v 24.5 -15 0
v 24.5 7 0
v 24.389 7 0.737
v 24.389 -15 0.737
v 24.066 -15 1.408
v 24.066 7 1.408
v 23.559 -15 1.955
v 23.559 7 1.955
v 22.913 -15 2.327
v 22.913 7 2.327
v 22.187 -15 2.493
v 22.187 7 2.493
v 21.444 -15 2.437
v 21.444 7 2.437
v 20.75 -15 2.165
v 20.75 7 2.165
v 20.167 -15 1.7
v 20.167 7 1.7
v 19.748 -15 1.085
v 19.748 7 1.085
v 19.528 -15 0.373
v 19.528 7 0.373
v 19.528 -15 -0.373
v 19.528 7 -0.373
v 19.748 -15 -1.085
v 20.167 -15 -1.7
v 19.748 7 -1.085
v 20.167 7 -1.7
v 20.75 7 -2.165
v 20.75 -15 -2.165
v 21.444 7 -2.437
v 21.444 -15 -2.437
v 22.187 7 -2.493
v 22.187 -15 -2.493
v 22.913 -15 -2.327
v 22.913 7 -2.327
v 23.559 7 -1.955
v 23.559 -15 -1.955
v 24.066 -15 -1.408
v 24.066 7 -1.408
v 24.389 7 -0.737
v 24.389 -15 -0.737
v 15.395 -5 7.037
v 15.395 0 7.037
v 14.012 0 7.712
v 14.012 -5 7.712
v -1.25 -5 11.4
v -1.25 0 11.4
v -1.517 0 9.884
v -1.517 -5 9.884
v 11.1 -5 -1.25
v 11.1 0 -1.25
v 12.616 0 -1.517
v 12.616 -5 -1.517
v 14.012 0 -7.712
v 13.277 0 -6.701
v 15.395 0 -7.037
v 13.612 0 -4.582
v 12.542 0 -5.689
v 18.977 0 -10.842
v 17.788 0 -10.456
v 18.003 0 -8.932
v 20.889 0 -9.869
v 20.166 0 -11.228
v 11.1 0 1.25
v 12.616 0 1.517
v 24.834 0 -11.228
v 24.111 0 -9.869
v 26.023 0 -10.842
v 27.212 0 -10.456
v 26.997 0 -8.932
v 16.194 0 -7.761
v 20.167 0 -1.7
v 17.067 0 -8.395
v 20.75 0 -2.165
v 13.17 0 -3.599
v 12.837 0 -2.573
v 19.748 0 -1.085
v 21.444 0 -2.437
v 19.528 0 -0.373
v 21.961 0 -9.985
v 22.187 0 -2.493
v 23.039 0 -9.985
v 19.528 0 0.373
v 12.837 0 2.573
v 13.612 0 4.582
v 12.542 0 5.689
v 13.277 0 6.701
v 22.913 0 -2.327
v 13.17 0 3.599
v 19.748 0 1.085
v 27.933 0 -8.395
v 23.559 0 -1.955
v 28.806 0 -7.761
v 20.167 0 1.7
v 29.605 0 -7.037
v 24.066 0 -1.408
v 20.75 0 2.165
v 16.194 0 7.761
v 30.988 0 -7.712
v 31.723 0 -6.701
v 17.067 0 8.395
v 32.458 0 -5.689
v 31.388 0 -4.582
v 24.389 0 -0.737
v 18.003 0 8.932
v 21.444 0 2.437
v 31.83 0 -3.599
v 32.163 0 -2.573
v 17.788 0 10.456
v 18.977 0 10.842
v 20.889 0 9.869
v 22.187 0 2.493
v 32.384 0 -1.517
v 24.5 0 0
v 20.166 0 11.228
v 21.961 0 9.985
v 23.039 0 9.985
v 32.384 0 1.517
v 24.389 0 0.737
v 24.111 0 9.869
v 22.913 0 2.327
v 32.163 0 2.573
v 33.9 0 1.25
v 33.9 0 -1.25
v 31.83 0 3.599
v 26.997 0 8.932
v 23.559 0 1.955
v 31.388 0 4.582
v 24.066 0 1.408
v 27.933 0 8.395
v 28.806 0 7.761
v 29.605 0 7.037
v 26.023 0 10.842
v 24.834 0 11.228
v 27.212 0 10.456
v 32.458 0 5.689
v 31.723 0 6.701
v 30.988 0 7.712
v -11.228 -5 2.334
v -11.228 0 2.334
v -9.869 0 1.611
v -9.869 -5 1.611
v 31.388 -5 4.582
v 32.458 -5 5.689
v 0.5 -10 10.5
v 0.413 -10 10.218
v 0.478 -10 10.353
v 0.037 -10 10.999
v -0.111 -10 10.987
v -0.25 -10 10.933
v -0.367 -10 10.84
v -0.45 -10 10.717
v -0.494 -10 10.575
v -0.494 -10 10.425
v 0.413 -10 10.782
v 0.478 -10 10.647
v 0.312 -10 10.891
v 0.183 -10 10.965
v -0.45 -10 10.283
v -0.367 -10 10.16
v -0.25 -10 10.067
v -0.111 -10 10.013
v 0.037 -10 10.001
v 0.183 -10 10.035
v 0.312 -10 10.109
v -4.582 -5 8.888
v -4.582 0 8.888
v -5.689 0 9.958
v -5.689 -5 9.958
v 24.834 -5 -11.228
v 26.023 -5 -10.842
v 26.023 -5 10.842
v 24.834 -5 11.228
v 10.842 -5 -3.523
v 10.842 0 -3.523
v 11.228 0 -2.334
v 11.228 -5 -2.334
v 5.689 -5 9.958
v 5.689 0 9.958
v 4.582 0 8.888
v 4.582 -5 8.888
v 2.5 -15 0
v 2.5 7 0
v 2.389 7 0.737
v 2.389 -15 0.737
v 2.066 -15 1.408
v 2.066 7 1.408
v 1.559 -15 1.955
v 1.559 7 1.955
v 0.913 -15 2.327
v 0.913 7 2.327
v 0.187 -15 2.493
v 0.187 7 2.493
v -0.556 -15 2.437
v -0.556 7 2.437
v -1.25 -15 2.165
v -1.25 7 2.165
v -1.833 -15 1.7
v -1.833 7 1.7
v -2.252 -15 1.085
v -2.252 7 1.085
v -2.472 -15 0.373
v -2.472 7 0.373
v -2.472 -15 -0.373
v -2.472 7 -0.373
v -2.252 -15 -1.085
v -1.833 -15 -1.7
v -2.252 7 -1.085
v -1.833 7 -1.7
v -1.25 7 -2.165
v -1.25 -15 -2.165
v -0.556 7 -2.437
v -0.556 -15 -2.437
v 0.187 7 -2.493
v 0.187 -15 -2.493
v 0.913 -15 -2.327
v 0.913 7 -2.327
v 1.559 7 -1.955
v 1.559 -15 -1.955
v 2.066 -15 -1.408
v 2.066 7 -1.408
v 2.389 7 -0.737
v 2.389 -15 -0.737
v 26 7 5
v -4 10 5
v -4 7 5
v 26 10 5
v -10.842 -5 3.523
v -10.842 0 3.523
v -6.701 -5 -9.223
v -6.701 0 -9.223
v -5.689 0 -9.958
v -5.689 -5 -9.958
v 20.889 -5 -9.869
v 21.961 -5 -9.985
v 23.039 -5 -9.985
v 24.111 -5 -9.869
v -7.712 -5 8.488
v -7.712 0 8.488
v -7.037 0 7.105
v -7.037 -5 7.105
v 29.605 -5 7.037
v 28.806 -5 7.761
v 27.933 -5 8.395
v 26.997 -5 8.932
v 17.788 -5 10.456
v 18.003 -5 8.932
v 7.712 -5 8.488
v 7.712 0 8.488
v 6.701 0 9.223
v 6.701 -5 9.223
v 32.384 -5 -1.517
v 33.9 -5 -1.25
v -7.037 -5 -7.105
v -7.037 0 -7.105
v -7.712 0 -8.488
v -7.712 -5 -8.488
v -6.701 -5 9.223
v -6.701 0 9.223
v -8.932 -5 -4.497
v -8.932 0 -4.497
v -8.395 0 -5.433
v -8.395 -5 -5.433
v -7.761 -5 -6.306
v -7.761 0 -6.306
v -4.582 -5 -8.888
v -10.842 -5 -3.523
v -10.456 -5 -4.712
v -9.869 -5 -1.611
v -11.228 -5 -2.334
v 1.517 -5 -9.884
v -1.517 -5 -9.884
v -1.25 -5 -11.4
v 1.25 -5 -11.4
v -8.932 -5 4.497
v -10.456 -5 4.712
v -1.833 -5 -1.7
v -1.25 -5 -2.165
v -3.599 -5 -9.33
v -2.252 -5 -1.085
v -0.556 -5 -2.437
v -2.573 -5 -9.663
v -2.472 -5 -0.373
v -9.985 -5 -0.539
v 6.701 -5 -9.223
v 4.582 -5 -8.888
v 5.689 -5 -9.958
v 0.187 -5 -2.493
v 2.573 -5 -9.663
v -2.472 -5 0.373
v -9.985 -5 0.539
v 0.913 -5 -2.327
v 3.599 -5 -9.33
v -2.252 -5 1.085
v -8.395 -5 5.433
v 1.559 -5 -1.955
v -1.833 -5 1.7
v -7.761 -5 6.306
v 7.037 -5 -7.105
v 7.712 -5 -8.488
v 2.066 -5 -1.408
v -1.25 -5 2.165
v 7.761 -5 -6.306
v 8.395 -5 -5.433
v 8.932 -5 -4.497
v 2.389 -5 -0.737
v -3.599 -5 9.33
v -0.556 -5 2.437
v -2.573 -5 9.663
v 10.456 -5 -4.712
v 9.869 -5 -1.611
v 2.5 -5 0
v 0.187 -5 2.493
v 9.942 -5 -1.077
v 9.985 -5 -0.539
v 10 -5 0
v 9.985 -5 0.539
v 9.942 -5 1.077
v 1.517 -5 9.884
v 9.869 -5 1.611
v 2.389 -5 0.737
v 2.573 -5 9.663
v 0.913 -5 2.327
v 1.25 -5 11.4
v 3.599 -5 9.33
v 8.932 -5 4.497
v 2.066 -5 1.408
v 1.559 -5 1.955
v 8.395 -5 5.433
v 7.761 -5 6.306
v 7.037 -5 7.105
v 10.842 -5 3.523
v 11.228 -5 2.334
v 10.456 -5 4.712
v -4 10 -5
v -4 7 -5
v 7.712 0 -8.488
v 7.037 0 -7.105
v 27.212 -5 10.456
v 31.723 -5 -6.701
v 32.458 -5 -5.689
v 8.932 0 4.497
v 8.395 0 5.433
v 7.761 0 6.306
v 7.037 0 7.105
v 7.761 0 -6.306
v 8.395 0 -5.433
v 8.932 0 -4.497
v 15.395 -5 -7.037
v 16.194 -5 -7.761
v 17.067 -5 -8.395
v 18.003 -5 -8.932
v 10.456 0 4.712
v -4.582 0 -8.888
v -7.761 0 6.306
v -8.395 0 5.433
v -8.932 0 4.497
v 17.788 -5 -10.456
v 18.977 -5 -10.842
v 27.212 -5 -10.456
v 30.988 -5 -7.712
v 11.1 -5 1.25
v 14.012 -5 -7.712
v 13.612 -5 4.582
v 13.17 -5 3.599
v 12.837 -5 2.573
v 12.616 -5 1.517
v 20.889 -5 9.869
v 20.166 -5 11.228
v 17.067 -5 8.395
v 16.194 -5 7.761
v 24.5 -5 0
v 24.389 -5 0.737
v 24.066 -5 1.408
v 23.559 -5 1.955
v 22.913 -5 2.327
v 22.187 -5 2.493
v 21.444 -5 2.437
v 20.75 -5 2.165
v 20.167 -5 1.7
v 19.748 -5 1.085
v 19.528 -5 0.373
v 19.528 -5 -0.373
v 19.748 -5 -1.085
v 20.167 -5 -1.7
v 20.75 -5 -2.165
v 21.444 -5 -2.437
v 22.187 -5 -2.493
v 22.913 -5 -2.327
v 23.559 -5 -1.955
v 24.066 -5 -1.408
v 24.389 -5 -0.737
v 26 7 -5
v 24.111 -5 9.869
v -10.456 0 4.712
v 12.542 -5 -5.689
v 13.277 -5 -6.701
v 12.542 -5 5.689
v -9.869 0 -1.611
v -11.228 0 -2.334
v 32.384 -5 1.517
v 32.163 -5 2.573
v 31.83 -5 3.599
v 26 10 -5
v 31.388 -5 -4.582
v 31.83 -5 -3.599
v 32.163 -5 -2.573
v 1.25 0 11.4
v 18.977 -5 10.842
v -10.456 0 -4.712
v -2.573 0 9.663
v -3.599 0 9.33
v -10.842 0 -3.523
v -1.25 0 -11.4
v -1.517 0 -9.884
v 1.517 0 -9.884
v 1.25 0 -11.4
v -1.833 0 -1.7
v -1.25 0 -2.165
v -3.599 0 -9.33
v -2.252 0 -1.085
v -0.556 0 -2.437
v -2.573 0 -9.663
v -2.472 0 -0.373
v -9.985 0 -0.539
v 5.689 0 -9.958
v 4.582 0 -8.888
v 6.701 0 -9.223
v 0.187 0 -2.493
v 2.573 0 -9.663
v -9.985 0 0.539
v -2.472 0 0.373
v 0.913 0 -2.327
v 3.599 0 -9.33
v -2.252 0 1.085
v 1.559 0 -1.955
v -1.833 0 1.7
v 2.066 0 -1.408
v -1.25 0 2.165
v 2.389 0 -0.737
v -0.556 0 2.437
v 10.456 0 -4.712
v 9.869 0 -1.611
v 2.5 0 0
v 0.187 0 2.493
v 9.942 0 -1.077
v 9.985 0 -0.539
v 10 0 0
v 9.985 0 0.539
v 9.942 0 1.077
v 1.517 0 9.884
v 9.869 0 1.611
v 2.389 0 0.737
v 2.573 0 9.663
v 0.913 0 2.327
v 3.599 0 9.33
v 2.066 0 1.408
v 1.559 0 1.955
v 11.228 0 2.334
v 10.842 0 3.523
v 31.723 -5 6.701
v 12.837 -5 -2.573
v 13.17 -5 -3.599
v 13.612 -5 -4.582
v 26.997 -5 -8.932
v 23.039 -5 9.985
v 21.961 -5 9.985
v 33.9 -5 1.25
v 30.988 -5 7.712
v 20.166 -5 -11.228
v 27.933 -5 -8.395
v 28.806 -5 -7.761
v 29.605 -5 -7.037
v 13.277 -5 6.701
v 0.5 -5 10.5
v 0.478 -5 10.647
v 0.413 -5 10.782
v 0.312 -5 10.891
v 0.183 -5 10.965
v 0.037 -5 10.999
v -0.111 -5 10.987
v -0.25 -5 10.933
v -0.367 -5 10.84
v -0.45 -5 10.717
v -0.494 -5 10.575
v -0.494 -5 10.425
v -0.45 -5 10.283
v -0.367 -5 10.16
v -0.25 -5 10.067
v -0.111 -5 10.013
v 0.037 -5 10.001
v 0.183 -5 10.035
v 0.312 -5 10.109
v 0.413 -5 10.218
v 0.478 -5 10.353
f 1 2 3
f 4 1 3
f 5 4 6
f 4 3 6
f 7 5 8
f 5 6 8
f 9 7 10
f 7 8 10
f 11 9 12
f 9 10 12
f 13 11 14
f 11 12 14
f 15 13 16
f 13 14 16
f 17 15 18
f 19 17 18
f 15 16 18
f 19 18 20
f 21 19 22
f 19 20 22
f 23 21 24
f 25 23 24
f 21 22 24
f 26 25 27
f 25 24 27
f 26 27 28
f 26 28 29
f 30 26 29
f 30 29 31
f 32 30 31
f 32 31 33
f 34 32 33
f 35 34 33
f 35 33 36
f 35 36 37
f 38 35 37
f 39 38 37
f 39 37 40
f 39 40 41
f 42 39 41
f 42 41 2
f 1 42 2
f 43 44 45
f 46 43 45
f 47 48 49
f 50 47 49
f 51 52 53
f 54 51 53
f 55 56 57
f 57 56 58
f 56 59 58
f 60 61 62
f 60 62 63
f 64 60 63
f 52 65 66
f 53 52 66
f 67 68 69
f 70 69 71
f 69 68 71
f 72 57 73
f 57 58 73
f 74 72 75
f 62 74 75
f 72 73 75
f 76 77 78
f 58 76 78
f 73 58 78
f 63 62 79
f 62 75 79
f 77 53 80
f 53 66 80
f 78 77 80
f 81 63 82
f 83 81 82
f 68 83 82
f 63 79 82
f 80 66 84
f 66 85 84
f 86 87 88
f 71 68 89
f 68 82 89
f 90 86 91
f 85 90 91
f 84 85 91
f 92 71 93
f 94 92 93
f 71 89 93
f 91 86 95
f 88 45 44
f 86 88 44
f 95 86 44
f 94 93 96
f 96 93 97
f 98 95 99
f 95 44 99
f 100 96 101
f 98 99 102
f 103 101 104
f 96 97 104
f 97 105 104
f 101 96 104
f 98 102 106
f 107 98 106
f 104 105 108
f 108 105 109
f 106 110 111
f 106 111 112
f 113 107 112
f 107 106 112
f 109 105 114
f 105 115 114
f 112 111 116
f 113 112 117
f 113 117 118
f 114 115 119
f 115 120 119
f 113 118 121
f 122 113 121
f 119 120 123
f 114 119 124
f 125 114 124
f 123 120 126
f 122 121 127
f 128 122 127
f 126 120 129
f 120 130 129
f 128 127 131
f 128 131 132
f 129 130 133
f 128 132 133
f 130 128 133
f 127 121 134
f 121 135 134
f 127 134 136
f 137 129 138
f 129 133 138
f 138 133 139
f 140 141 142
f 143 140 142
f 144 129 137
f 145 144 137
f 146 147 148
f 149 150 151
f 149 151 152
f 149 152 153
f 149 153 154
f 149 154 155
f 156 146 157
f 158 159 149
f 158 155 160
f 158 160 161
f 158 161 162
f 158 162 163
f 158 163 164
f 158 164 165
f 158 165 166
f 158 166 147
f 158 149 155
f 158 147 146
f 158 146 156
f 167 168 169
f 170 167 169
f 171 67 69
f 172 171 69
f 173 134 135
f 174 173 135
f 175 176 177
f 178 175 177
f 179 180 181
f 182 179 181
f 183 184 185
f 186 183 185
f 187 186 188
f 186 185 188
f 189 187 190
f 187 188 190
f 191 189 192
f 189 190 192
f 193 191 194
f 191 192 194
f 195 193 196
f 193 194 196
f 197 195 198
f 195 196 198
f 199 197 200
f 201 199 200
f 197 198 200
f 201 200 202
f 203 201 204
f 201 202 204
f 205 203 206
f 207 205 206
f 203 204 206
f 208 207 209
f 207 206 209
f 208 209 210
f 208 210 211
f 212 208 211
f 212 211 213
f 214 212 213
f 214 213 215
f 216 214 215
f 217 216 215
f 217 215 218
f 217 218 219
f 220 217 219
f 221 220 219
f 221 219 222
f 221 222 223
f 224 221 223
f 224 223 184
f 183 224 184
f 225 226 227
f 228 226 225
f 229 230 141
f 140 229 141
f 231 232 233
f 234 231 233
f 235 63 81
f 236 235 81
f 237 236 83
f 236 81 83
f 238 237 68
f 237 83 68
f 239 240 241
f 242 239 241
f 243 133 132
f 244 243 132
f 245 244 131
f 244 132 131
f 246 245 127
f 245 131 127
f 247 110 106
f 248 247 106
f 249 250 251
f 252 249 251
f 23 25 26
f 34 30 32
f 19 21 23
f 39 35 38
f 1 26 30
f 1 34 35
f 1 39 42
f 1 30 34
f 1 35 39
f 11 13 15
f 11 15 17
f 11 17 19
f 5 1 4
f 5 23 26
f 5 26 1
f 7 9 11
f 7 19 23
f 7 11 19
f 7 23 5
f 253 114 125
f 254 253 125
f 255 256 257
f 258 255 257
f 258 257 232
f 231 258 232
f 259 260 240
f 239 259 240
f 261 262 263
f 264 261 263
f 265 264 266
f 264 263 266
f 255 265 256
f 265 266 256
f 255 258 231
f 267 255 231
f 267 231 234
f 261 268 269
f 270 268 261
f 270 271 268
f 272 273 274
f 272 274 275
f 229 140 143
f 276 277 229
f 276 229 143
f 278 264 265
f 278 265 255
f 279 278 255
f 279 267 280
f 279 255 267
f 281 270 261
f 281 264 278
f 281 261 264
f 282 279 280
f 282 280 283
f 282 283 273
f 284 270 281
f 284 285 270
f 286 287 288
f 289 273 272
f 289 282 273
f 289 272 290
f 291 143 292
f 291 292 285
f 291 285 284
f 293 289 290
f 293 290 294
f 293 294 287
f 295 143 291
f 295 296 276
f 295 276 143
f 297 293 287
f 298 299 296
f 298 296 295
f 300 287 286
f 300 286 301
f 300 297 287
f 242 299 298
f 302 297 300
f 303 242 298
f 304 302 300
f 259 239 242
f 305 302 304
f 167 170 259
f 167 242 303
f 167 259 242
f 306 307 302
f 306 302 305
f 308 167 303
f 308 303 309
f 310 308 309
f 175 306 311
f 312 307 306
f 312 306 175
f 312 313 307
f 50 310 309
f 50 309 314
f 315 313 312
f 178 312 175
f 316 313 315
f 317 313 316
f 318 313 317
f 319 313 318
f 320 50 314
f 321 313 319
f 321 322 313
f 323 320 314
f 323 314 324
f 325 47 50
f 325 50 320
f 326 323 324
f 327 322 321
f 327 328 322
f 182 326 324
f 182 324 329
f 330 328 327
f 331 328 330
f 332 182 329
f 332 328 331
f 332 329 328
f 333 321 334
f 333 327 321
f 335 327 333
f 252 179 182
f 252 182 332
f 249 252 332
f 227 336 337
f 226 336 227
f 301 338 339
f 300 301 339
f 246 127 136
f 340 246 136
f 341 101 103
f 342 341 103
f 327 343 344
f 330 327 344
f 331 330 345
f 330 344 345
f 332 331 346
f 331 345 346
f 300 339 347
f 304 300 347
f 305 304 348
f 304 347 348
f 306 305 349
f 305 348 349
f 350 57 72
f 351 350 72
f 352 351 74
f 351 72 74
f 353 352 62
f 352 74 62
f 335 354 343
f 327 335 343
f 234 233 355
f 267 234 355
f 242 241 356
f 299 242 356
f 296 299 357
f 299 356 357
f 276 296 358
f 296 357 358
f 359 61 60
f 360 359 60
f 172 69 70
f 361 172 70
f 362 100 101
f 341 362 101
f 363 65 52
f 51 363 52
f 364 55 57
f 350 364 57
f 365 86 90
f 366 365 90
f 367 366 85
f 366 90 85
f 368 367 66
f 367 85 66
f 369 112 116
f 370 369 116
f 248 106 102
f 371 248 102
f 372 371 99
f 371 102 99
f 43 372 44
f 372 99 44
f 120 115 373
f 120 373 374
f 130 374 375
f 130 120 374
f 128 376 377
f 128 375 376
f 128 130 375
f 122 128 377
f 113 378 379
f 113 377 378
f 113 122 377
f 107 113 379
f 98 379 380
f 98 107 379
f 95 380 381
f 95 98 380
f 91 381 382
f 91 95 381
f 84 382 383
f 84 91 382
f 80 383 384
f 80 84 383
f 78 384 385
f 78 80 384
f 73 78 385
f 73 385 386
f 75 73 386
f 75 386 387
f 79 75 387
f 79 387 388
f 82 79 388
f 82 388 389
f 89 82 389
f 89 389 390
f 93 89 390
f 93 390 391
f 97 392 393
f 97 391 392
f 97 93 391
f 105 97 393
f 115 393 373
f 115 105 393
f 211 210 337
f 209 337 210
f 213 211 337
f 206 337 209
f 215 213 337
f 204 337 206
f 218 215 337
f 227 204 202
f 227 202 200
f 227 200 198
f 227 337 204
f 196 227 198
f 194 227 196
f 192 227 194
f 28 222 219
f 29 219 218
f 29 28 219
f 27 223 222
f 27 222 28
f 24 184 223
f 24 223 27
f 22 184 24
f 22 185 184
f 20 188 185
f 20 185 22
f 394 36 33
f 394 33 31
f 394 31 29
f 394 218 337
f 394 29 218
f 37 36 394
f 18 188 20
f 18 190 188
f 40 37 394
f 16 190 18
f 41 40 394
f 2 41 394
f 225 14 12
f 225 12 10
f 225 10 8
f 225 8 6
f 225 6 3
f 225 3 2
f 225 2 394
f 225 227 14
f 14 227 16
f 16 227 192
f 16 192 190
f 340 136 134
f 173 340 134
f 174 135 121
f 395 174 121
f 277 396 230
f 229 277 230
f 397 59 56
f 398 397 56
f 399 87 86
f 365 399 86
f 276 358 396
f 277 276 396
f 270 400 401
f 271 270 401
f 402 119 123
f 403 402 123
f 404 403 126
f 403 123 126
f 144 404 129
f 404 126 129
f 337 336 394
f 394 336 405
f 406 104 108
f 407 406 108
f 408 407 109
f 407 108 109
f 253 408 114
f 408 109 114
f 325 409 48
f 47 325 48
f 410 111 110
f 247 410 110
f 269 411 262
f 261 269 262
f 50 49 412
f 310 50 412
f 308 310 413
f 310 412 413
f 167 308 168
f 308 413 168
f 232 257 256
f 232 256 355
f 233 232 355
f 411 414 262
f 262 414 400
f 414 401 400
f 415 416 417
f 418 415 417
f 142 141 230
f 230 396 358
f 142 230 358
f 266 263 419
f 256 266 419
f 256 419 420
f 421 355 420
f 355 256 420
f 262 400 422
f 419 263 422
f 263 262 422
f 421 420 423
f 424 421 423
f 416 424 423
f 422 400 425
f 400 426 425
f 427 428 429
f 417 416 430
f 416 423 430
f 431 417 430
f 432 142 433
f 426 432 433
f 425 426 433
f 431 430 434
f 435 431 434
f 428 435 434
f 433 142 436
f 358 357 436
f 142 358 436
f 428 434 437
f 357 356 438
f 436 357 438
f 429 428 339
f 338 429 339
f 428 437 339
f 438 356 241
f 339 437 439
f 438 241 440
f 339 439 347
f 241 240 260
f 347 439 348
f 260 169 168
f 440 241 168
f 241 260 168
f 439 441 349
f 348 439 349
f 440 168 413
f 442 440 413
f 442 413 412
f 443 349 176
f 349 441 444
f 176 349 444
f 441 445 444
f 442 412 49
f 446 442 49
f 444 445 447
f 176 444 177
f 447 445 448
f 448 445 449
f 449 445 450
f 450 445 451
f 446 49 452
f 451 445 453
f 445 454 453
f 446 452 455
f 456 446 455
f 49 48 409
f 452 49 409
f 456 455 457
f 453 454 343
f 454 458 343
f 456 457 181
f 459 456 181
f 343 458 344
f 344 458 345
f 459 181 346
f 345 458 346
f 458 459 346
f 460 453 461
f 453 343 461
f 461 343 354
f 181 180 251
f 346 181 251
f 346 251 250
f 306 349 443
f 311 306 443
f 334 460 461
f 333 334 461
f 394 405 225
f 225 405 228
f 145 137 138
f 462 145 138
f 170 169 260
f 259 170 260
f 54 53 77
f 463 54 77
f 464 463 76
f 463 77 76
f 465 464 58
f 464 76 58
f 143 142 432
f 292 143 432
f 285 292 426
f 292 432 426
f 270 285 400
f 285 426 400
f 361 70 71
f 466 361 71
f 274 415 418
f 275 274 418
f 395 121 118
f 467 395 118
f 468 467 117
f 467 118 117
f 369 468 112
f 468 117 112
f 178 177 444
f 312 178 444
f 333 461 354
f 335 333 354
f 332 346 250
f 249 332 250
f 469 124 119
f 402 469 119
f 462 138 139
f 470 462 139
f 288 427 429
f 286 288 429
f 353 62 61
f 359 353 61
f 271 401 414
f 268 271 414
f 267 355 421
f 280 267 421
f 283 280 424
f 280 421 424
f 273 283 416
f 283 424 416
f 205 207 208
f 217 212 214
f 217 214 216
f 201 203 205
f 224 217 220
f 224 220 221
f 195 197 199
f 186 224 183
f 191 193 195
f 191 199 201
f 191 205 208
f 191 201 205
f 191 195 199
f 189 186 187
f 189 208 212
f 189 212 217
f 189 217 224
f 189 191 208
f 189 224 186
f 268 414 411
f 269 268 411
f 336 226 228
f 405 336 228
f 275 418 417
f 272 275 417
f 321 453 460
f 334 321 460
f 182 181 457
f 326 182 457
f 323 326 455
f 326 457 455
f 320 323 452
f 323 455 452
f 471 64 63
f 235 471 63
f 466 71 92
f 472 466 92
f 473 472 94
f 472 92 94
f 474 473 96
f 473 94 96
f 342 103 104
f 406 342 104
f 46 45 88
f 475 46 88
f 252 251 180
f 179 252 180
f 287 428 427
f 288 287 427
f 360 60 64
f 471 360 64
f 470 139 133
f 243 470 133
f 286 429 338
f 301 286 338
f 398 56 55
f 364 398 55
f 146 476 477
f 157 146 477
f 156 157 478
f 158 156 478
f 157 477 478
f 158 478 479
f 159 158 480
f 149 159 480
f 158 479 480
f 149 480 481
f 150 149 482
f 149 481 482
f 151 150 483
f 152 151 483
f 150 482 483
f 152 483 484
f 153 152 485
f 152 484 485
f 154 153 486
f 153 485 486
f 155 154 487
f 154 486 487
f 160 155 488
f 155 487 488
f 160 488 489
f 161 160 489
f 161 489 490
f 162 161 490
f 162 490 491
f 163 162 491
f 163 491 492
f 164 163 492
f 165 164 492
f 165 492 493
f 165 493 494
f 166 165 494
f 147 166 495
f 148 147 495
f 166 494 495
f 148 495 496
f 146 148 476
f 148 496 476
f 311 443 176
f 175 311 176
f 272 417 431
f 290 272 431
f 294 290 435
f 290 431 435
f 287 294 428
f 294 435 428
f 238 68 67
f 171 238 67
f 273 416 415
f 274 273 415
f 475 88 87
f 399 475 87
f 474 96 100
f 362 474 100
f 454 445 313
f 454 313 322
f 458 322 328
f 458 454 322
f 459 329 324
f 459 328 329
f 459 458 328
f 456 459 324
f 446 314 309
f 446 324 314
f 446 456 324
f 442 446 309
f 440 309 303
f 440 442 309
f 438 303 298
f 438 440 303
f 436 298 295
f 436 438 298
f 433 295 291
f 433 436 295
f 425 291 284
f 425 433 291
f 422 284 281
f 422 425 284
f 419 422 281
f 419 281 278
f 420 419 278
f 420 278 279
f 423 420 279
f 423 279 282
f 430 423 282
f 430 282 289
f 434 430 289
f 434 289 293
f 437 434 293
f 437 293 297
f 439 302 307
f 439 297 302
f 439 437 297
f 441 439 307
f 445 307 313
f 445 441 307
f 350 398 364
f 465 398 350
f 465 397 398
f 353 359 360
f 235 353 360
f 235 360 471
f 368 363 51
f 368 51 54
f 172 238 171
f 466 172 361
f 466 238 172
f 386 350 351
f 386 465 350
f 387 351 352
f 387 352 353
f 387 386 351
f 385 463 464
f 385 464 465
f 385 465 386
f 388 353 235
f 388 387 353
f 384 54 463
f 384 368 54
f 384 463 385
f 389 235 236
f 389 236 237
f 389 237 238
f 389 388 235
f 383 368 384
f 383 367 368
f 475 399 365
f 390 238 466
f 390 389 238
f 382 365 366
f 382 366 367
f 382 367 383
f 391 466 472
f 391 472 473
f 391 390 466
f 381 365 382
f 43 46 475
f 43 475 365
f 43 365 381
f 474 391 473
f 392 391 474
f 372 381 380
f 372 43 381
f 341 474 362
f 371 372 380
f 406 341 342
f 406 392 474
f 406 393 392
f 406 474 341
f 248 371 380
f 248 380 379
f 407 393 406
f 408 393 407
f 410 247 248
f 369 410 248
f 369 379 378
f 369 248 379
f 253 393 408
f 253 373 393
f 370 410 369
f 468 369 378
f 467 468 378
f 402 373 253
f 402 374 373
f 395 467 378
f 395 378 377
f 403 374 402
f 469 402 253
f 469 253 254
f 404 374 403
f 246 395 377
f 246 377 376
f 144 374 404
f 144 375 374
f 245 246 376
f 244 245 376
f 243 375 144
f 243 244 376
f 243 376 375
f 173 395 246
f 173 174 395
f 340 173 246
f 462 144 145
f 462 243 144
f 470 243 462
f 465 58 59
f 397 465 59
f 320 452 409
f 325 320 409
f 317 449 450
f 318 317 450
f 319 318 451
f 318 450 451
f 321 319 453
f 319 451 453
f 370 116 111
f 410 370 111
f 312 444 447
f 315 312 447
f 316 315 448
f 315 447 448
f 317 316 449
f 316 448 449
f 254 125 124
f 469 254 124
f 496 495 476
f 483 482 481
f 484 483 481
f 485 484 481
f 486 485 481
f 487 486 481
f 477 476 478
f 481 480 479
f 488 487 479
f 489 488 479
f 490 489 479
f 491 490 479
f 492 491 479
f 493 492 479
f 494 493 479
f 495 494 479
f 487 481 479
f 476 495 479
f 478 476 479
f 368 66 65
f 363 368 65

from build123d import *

# Parameters (mm, degrees)
F1_DEPTH  = 5
F3_DEPTH  = 5
F5_R      = 2.5
F6_DEPTH  = 25
F9_DEPTH  = 25
F11_W     = 30
F11_H     = 10
F12_DEPTH = 3
F13_R     = 0.5
F14_DEPTH = 5


with BuildPart() as f1:
    # F0 (on Front) → F1 (new body)
    with BuildSketch(Plane.XZ):
        with BuildLine():
            ThreePointArc((9.869319, -1.611382), (9.967276, -0.808336), (10, 0))
            ThreePointArc((10, 0), (9.967276, 0.808336), (9.869319, 1.611382))
            ThreePointArc((9.869319, 1.611382), (9.510565, 3.09017), (8.931593, 4.497405))
            ThreePointArc((8.931593, 4.497405), (8.09017, 5.877853), (7.0373, 7.104675))
            ThreePointArc((7.0373, 7.104675), (5.877853, 8.09017), (4.582302, 8.888335))
            ThreePointArc((4.582302, 8.888335), (3.09017, 9.510565), (1.517272, 9.884224))
            ThreePointArc((1.517272, 9.884224), (0, 10), (-1.517272, 9.884224))
            ThreePointArc((-1.517272, 9.884224), (-3.09017, 9.510565), (-4.582302, 8.888335))
            ThreePointArc((-4.582302, 8.888335), (-5.877853, 8.09017), (-7.0373, 7.104675))
            ThreePointArc((-7.0373, 7.104675), (-8.09017, 5.877853), (-8.931593, 4.497405))
            ThreePointArc((-8.931593, 4.497405), (-9.510565, 3.09017), (-9.869319, 1.611382))
            ThreePointArc((-9.869319, 1.611382), (-10, 0), (-9.869319, -1.611382))
            ThreePointArc((-9.869319, -1.611382), (-9.510565, -3.09017), (-8.931593, -4.497405))
            ThreePointArc((-8.931593, -4.497405), (-8.09017, -5.877853), (-7.0373, -7.104675))
            ThreePointArc((-7.0373, -7.104675), (-5.877853, -8.09017), (-4.582302, -8.888335))
            ThreePointArc((-4.582302, -8.888335), (-3.09017, -9.510565), (-1.517272, -9.884224))
            ThreePointArc((-1.517272, -9.884224), (0, -10), (1.517272, -9.884224))
            ThreePointArc((1.517272, -9.884224), (3.09017, -9.510565), (4.582302, -8.888335))
            ThreePointArc((4.582302, -8.888335), (5.877853, -8.09017), (7.0373, -7.104675))
            ThreePointArc((7.0373, -7.104675), (8.09017, -5.877853), (8.931593, -4.497405))
            ThreePointArc((8.931593, -4.497405), (9.510565, -3.09017), (9.869319, -1.611382))
        make_face()
        with BuildLine():
            ThreePointArc((8.931593, 4.497405), (9.510565, 3.09017), (9.869319, 1.611382))
            Line((9.869319, 1.611382), (11.228316, 2.333973))
            Line((11.228316, 2.333973), (10.842044, 3.522794))
            Line((10.842044, 3.522794), (10.455773, 4.711614))
            Line((10.455773, 4.711614), (8.931593, 4.497405))
        make_face()
        with BuildLine():
            Line((11.228316, -2.333973), (9.869319, -1.611382))
            ThreePointArc((9.869319, -1.611382), (9.510565, -3.09017), (8.931593, -4.497405))
            Line((8.931593, -4.497405), (10.455773, -4.711614))
            Line((10.455773, -4.711614), (10.842044, -3.522794))
            Line((10.842044, -3.522794), (11.228316, -2.333973))
        make_face()
        with BuildLine():
            ThreePointArc((4.582302, 8.888335), (5.877853, 8.09017), (7.0373, 7.104675))
            Line((7.0373, 7.104675), (7.712023, 8.488062))
            Line((7.712023, 8.488062), (6.700752, 9.222794))
            Line((6.700752, 9.222794), (5.689481, 9.957525))
            Line((5.689481, 9.957525), (4.582302, 8.888335))
        make_face()
        with BuildLine():
            Line((7.712023, -8.488062), (7.0373, -7.104675))
            ThreePointArc((7.0373, -7.104675), (5.877853, -8.09017), (4.582302, -8.888335))
            Line((4.582302, -8.888335), (5.689481, -9.957525))
            Line((5.689481, -9.957525), (6.700752, -9.222794))
            Line((6.700752, -9.222794), (7.712023, -8.488062))
        make_face()
        with BuildLine():
            ThreePointArc((-1.517272, 9.884224), (0, 10), (1.517272, 9.884224))
            Line((1.517272, 9.884224), (1.25, 11.4))
            Line((1.25, 11.4), (0, 11.4))
            Line((0, 11.4), (-1.25, 11.4))
            Line((-1.25, 11.4), (-1.517272, 9.884224))
        make_face()
        with BuildLine():
            Line((1.25, -11.4), (1.517272, -9.884224))
            ThreePointArc((1.517272, -9.884224), (0, -10), (-1.517272, -9.884224))
            Line((-1.517272, -9.884224), (-1.25, -11.4))
            Line((-1.25, -11.4), (0, -11.4))
            Line((0, -11.4), (1.25, -11.4))
        make_face()
        with BuildLine():
            ThreePointArc((-7.0373, 7.104675), (-5.877853, 8.09017), (-4.582302, 8.888335))
            Line((-4.582302, 8.888335), (-5.689481, 9.957525))
            Line((-5.689481, 9.957525), (-6.700752, 9.222794))
            Line((-6.700752, 9.222794), (-7.712023, 8.488062))
            Line((-7.712023, 8.488062), (-7.0373, 7.104675))
        make_face()
        with BuildLine():
            Line((-5.689481, -9.957525), (-4.582302, -8.888335))
            ThreePointArc((-4.582302, -8.888335), (-5.877853, -8.09017), (-7.0373, -7.104675))
            Line((-7.0373, -7.104675), (-7.712023, -8.488062))
            Line((-7.712023, -8.488062), (-6.700752, -9.222794))
            Line((-6.700752, -9.222794), (-5.689481, -9.957525))
        make_face()
        with BuildLine():
            ThreePointArc((-9.869319, 1.611382), (-9.510565, 3.09017), (-8.931593, 4.497405))
            Line((-8.931593, 4.497405), (-10.455773, 4.711614))
            Line((-10.455773, 4.711614), (-10.842044, 3.522794))
            Line((-10.842044, 3.522794), (-11.228316, 2.333973))
            Line((-11.228316, 2.333973), (-9.869319, 1.611382))
        make_face()
        with BuildLine():
            Line((-10.455773, -4.711614), (-8.931593, -4.497405))
            ThreePointArc((-8.931593, -4.497405), (-9.510565, -3.09017), (-9.869319, -1.611382))
            Line((-9.869319, -1.611382), (-11.228316, -2.333973))
            Line((-11.228316, -2.333973), (-10.842044, -3.522794))
            Line((-10.842044, -3.522794), (-10.455773, -4.711614))
        make_face()
    extrude(amount=F1_DEPTH)


with BuildPart() as f3:
    # F2 (on Front) → F3 (new body)
    with BuildSketch(Plane.XZ):
        with BuildLine():
            Line((11.1, 1.25), (11.1, 0))
            Line((11.1, 0), (12.5, 0))
            ThreePointArc((12.5, 0), (12.528986, 0.760841), (12.615776, 1.517272))
            Line((12.615776, 1.517272), (11.1, 1.25))
        make_face()
        with BuildLine():
            Line((12.5, 0), (11.1, 0))
            Line((11.1, 0), (11.1, -1.25))
            Line((11.1, -1.25), (12.615776, -1.517272))
            ThreePointArc((12.615776, -1.517272), (12.528986, -0.760841), (12.5, 0))
        make_face()
        with BuildLine():
            ThreePointArc((12.615776, 1.517272), (12.528986, 0.760841), (12.5, 0))
            ThreePointArc((12.5, 0), (12.528986, -0.760841), (12.615776, -1.517272))
            ThreePointArc((12.615776, -1.517272), (12.989435, -3.09017), (13.611665, -4.582302))
            ThreePointArc((13.611665, -4.582302), (14.40983, -5.877853), (15.395325, -7.0373))
            ThreePointArc((15.395325, -7.0373), (16.622147, -8.09017), (18.002595, -8.931593))
            ThreePointArc((18.002595, -8.931593), (19.40983, -9.510565), (20.888618, -9.869319))
            ThreePointArc((20.888618, -9.869319), (22.5, -10), (24.111382, -9.869319))
            ThreePointArc((24.111382, -9.869319), (25.59017, -9.510565), (26.997405, -8.931593))
            ThreePointArc((26.997405, -8.931593), (28.377853, -8.09017), (29.604675, -7.0373))
            ThreePointArc((29.604675, -7.0373), (30.59017, -5.877853), (31.388335, -4.582302))
            ThreePointArc((31.388335, -4.582302), (32.010565, -3.09017), (32.384224, -1.517272))
            ThreePointArc((32.384224, -1.517272), (32.471014, -0.760841), (32.5, 0))
            ThreePointArc((32.5, 0), (32.471014, 0.760841), (32.384224, 1.517272))
            ThreePointArc((32.384224, 1.517272), (32.010565, 3.09017), (31.388335, 4.582302))
            ThreePointArc((31.388335, 4.582302), (30.59017, 5.877853), (29.604675, 7.0373))
            ThreePointArc((29.604675, 7.0373), (28.377853, 8.09017), (26.997405, 8.931593))
            ThreePointArc((26.997405, 8.931593), (25.59017, 9.510565), (24.111382, 9.869319))
            ThreePointArc((24.111382, 9.869319), (22.5, 10), (20.888618, 9.869319))
            ThreePointArc((20.888618, 9.869319), (19.40983, 9.510565), (18.002595, 8.931593))
            ThreePointArc((18.002595, 8.931593), (16.622147, 8.09017), (15.395325, 7.0373))
            ThreePointArc((15.395325, 7.0373), (14.40983, 5.877853), (13.611665, 4.582302))
            ThreePointArc((13.611665, 4.582302), (12.989435, 3.09017), (12.615776, 1.517272))
        make_face()
        with BuildLine():
            Line((12.542475, 5.689481), (13.611665, 4.582302))
            ThreePointArc((13.611665, 4.582302), (14.40983, 5.877853), (15.395325, 7.0373))
            Line((15.395325, 7.0373), (14.011938, 7.712023))
            Line((14.011938, 7.712023), (13.277206, 6.700752))
            Line((13.277206, 6.700752), (12.542475, 5.689481))
        make_face()
        with BuildLine():
            ThreePointArc((15.395325, -7.0373), (14.40983, -5.877853), (13.611665, -4.582302))
            Line((13.611665, -4.582302), (12.542475, -5.689481))
            Line((12.542475, -5.689481), (13.277206, -6.700752))
            Line((13.277206, -6.700752), (14.011938, -7.712023))
            Line((14.011938, -7.712023), (15.395325, -7.0373))
        make_face()
        with BuildLine():
            Line((17.788386, 10.455773), (18.002595, 8.931593))
            ThreePointArc((18.002595, 8.931593), (19.40983, 9.510565), (20.888618, 9.869319))
            Line((20.888618, 9.869319), (20.166027, 11.228316))
            Line((20.166027, 11.228316), (18.977206, 10.842044))
            Line((18.977206, 10.842044), (17.788386, 10.455773))
        make_face()
        with BuildLine():
            ThreePointArc((20.888618, -9.869319), (19.40983, -9.510565), (18.002595, -8.931593))
            Line((18.002595, -8.931593), (17.788386, -10.455773))
            Line((17.788386, -10.455773), (18.977206, -10.842044))
            Line((18.977206, -10.842044), (20.166027, -11.228316))
            Line((20.166027, -11.228316), (20.888618, -9.869319))
        make_face()
        with BuildLine():
            Line((24.833973, 11.228316), (24.111382, 9.869319))
            ThreePointArc((24.111382, 9.869319), (25.59017, 9.510565), (26.997405, 8.931593))
            Line((26.997405, 8.931593), (27.211614, 10.455773))
            Line((27.211614, 10.455773), (26.022794, 10.842044))
            Line((26.022794, 10.842044), (24.833973, 11.228316))
        make_face()
        with BuildLine():
            ThreePointArc((26.997405, -8.931593), (25.59017, -9.510565), (24.111382, -9.869319))
            Line((24.111382, -9.869319), (24.833973, -11.228316))
            Line((24.833973, -11.228316), (26.022794, -10.842044))
            Line((26.022794, -10.842044), (27.211614, -10.455773))
            Line((27.211614, -10.455773), (26.997405, -8.931593))
        make_face()
        with BuildLine():
            Line((30.988062, 7.712023), (29.604675, 7.0373))
            ThreePointArc((29.604675, 7.0373), (30.59017, 5.877853), (31.388335, 4.582302))
            Line((31.388335, 4.582302), (32.457525, 5.689481))
            Line((32.457525, 5.689481), (31.722794, 6.700752))
            Line((31.722794, 6.700752), (30.988062, 7.712023))
        make_face()
        with BuildLine():
            ThreePointArc((31.388335, -4.582302), (30.59017, -5.877853), (29.604675, -7.0373))
            Line((29.604675, -7.0373), (30.988062, -7.712023))
            Line((30.988062, -7.712023), (31.722794, -6.700752))
            Line((31.722794, -6.700752), (32.457525, -5.689481))
            Line((32.457525, -5.689481), (31.388335, -4.582302))
        make_face()
        with BuildLine():
            Line((33.9, 1.25), (32.384224, 1.517272))
            ThreePointArc((32.384224, 1.517272), (32.471014, 0.760841), (32.5, 0))
            ThreePointArc((32.5, 0), (32.471014, -0.760841), (32.384224, -1.517272))
            Line((32.384224, -1.517272), (33.9, -1.25))
            Line((33.9, -1.25), (33.9, 0))
            Line((33.9, 0), (33.9, 1.25))
        make_face()
    extrude(amount=F3_DEPTH)


with BuildPart() as f6:
    # F5 (on offset) → F6 (new body)
    with BuildSketch(Plane.XZ.offset(-10)):
        Circle(F5_R)
    extrude(amount=F6_DEPTH)



with BuildPart() as f1_1:
    add(f1.part)

    # F7: cut F6
    add(f6.part, mode=Mode.SUBTRACT)


with BuildPart() as f9:
    # F8 (on offset) → F9 (new body)
    with BuildSketch(Plane.XZ.offset(-10)):
        with BuildLine():
            ThreePointArc((19.5, 0), (22, -2.5), (24.5, 0))
            ThreePointArc((24.5, 0), (22, 2.5), (19.5, 0))
        make_face()
    extrude(amount=F9_DEPTH)


with BuildPart() as f3_1:
    add(f3.part)

    # F10: cut F9
    add(f9.part, mode=Mode.SUBTRACT)


with BuildPart() as f6_1:
    add(f6.part)

    add(f9.part)  # F12 merges F9
    # F11 (on offset) → F12 (join)
    with BuildSketch(Plane.XZ.offset(-10)):
        with Locations((11, 0)):
            Rectangle(F11_W, F11_H)
    extrude(amount=F12_DEPTH)


with BuildPart() as f14:
    # F13 (on face) → F14 (new body)
    with BuildSketch(Plane.XZ.offset(5)):
        with Locations((0, 10.5)):
            Circle(F13_R)
    extrude(amount=F14_DEPTH)


solid = Compound([f1_1.part, f3_1.part, f6_1.part, f14.part])
